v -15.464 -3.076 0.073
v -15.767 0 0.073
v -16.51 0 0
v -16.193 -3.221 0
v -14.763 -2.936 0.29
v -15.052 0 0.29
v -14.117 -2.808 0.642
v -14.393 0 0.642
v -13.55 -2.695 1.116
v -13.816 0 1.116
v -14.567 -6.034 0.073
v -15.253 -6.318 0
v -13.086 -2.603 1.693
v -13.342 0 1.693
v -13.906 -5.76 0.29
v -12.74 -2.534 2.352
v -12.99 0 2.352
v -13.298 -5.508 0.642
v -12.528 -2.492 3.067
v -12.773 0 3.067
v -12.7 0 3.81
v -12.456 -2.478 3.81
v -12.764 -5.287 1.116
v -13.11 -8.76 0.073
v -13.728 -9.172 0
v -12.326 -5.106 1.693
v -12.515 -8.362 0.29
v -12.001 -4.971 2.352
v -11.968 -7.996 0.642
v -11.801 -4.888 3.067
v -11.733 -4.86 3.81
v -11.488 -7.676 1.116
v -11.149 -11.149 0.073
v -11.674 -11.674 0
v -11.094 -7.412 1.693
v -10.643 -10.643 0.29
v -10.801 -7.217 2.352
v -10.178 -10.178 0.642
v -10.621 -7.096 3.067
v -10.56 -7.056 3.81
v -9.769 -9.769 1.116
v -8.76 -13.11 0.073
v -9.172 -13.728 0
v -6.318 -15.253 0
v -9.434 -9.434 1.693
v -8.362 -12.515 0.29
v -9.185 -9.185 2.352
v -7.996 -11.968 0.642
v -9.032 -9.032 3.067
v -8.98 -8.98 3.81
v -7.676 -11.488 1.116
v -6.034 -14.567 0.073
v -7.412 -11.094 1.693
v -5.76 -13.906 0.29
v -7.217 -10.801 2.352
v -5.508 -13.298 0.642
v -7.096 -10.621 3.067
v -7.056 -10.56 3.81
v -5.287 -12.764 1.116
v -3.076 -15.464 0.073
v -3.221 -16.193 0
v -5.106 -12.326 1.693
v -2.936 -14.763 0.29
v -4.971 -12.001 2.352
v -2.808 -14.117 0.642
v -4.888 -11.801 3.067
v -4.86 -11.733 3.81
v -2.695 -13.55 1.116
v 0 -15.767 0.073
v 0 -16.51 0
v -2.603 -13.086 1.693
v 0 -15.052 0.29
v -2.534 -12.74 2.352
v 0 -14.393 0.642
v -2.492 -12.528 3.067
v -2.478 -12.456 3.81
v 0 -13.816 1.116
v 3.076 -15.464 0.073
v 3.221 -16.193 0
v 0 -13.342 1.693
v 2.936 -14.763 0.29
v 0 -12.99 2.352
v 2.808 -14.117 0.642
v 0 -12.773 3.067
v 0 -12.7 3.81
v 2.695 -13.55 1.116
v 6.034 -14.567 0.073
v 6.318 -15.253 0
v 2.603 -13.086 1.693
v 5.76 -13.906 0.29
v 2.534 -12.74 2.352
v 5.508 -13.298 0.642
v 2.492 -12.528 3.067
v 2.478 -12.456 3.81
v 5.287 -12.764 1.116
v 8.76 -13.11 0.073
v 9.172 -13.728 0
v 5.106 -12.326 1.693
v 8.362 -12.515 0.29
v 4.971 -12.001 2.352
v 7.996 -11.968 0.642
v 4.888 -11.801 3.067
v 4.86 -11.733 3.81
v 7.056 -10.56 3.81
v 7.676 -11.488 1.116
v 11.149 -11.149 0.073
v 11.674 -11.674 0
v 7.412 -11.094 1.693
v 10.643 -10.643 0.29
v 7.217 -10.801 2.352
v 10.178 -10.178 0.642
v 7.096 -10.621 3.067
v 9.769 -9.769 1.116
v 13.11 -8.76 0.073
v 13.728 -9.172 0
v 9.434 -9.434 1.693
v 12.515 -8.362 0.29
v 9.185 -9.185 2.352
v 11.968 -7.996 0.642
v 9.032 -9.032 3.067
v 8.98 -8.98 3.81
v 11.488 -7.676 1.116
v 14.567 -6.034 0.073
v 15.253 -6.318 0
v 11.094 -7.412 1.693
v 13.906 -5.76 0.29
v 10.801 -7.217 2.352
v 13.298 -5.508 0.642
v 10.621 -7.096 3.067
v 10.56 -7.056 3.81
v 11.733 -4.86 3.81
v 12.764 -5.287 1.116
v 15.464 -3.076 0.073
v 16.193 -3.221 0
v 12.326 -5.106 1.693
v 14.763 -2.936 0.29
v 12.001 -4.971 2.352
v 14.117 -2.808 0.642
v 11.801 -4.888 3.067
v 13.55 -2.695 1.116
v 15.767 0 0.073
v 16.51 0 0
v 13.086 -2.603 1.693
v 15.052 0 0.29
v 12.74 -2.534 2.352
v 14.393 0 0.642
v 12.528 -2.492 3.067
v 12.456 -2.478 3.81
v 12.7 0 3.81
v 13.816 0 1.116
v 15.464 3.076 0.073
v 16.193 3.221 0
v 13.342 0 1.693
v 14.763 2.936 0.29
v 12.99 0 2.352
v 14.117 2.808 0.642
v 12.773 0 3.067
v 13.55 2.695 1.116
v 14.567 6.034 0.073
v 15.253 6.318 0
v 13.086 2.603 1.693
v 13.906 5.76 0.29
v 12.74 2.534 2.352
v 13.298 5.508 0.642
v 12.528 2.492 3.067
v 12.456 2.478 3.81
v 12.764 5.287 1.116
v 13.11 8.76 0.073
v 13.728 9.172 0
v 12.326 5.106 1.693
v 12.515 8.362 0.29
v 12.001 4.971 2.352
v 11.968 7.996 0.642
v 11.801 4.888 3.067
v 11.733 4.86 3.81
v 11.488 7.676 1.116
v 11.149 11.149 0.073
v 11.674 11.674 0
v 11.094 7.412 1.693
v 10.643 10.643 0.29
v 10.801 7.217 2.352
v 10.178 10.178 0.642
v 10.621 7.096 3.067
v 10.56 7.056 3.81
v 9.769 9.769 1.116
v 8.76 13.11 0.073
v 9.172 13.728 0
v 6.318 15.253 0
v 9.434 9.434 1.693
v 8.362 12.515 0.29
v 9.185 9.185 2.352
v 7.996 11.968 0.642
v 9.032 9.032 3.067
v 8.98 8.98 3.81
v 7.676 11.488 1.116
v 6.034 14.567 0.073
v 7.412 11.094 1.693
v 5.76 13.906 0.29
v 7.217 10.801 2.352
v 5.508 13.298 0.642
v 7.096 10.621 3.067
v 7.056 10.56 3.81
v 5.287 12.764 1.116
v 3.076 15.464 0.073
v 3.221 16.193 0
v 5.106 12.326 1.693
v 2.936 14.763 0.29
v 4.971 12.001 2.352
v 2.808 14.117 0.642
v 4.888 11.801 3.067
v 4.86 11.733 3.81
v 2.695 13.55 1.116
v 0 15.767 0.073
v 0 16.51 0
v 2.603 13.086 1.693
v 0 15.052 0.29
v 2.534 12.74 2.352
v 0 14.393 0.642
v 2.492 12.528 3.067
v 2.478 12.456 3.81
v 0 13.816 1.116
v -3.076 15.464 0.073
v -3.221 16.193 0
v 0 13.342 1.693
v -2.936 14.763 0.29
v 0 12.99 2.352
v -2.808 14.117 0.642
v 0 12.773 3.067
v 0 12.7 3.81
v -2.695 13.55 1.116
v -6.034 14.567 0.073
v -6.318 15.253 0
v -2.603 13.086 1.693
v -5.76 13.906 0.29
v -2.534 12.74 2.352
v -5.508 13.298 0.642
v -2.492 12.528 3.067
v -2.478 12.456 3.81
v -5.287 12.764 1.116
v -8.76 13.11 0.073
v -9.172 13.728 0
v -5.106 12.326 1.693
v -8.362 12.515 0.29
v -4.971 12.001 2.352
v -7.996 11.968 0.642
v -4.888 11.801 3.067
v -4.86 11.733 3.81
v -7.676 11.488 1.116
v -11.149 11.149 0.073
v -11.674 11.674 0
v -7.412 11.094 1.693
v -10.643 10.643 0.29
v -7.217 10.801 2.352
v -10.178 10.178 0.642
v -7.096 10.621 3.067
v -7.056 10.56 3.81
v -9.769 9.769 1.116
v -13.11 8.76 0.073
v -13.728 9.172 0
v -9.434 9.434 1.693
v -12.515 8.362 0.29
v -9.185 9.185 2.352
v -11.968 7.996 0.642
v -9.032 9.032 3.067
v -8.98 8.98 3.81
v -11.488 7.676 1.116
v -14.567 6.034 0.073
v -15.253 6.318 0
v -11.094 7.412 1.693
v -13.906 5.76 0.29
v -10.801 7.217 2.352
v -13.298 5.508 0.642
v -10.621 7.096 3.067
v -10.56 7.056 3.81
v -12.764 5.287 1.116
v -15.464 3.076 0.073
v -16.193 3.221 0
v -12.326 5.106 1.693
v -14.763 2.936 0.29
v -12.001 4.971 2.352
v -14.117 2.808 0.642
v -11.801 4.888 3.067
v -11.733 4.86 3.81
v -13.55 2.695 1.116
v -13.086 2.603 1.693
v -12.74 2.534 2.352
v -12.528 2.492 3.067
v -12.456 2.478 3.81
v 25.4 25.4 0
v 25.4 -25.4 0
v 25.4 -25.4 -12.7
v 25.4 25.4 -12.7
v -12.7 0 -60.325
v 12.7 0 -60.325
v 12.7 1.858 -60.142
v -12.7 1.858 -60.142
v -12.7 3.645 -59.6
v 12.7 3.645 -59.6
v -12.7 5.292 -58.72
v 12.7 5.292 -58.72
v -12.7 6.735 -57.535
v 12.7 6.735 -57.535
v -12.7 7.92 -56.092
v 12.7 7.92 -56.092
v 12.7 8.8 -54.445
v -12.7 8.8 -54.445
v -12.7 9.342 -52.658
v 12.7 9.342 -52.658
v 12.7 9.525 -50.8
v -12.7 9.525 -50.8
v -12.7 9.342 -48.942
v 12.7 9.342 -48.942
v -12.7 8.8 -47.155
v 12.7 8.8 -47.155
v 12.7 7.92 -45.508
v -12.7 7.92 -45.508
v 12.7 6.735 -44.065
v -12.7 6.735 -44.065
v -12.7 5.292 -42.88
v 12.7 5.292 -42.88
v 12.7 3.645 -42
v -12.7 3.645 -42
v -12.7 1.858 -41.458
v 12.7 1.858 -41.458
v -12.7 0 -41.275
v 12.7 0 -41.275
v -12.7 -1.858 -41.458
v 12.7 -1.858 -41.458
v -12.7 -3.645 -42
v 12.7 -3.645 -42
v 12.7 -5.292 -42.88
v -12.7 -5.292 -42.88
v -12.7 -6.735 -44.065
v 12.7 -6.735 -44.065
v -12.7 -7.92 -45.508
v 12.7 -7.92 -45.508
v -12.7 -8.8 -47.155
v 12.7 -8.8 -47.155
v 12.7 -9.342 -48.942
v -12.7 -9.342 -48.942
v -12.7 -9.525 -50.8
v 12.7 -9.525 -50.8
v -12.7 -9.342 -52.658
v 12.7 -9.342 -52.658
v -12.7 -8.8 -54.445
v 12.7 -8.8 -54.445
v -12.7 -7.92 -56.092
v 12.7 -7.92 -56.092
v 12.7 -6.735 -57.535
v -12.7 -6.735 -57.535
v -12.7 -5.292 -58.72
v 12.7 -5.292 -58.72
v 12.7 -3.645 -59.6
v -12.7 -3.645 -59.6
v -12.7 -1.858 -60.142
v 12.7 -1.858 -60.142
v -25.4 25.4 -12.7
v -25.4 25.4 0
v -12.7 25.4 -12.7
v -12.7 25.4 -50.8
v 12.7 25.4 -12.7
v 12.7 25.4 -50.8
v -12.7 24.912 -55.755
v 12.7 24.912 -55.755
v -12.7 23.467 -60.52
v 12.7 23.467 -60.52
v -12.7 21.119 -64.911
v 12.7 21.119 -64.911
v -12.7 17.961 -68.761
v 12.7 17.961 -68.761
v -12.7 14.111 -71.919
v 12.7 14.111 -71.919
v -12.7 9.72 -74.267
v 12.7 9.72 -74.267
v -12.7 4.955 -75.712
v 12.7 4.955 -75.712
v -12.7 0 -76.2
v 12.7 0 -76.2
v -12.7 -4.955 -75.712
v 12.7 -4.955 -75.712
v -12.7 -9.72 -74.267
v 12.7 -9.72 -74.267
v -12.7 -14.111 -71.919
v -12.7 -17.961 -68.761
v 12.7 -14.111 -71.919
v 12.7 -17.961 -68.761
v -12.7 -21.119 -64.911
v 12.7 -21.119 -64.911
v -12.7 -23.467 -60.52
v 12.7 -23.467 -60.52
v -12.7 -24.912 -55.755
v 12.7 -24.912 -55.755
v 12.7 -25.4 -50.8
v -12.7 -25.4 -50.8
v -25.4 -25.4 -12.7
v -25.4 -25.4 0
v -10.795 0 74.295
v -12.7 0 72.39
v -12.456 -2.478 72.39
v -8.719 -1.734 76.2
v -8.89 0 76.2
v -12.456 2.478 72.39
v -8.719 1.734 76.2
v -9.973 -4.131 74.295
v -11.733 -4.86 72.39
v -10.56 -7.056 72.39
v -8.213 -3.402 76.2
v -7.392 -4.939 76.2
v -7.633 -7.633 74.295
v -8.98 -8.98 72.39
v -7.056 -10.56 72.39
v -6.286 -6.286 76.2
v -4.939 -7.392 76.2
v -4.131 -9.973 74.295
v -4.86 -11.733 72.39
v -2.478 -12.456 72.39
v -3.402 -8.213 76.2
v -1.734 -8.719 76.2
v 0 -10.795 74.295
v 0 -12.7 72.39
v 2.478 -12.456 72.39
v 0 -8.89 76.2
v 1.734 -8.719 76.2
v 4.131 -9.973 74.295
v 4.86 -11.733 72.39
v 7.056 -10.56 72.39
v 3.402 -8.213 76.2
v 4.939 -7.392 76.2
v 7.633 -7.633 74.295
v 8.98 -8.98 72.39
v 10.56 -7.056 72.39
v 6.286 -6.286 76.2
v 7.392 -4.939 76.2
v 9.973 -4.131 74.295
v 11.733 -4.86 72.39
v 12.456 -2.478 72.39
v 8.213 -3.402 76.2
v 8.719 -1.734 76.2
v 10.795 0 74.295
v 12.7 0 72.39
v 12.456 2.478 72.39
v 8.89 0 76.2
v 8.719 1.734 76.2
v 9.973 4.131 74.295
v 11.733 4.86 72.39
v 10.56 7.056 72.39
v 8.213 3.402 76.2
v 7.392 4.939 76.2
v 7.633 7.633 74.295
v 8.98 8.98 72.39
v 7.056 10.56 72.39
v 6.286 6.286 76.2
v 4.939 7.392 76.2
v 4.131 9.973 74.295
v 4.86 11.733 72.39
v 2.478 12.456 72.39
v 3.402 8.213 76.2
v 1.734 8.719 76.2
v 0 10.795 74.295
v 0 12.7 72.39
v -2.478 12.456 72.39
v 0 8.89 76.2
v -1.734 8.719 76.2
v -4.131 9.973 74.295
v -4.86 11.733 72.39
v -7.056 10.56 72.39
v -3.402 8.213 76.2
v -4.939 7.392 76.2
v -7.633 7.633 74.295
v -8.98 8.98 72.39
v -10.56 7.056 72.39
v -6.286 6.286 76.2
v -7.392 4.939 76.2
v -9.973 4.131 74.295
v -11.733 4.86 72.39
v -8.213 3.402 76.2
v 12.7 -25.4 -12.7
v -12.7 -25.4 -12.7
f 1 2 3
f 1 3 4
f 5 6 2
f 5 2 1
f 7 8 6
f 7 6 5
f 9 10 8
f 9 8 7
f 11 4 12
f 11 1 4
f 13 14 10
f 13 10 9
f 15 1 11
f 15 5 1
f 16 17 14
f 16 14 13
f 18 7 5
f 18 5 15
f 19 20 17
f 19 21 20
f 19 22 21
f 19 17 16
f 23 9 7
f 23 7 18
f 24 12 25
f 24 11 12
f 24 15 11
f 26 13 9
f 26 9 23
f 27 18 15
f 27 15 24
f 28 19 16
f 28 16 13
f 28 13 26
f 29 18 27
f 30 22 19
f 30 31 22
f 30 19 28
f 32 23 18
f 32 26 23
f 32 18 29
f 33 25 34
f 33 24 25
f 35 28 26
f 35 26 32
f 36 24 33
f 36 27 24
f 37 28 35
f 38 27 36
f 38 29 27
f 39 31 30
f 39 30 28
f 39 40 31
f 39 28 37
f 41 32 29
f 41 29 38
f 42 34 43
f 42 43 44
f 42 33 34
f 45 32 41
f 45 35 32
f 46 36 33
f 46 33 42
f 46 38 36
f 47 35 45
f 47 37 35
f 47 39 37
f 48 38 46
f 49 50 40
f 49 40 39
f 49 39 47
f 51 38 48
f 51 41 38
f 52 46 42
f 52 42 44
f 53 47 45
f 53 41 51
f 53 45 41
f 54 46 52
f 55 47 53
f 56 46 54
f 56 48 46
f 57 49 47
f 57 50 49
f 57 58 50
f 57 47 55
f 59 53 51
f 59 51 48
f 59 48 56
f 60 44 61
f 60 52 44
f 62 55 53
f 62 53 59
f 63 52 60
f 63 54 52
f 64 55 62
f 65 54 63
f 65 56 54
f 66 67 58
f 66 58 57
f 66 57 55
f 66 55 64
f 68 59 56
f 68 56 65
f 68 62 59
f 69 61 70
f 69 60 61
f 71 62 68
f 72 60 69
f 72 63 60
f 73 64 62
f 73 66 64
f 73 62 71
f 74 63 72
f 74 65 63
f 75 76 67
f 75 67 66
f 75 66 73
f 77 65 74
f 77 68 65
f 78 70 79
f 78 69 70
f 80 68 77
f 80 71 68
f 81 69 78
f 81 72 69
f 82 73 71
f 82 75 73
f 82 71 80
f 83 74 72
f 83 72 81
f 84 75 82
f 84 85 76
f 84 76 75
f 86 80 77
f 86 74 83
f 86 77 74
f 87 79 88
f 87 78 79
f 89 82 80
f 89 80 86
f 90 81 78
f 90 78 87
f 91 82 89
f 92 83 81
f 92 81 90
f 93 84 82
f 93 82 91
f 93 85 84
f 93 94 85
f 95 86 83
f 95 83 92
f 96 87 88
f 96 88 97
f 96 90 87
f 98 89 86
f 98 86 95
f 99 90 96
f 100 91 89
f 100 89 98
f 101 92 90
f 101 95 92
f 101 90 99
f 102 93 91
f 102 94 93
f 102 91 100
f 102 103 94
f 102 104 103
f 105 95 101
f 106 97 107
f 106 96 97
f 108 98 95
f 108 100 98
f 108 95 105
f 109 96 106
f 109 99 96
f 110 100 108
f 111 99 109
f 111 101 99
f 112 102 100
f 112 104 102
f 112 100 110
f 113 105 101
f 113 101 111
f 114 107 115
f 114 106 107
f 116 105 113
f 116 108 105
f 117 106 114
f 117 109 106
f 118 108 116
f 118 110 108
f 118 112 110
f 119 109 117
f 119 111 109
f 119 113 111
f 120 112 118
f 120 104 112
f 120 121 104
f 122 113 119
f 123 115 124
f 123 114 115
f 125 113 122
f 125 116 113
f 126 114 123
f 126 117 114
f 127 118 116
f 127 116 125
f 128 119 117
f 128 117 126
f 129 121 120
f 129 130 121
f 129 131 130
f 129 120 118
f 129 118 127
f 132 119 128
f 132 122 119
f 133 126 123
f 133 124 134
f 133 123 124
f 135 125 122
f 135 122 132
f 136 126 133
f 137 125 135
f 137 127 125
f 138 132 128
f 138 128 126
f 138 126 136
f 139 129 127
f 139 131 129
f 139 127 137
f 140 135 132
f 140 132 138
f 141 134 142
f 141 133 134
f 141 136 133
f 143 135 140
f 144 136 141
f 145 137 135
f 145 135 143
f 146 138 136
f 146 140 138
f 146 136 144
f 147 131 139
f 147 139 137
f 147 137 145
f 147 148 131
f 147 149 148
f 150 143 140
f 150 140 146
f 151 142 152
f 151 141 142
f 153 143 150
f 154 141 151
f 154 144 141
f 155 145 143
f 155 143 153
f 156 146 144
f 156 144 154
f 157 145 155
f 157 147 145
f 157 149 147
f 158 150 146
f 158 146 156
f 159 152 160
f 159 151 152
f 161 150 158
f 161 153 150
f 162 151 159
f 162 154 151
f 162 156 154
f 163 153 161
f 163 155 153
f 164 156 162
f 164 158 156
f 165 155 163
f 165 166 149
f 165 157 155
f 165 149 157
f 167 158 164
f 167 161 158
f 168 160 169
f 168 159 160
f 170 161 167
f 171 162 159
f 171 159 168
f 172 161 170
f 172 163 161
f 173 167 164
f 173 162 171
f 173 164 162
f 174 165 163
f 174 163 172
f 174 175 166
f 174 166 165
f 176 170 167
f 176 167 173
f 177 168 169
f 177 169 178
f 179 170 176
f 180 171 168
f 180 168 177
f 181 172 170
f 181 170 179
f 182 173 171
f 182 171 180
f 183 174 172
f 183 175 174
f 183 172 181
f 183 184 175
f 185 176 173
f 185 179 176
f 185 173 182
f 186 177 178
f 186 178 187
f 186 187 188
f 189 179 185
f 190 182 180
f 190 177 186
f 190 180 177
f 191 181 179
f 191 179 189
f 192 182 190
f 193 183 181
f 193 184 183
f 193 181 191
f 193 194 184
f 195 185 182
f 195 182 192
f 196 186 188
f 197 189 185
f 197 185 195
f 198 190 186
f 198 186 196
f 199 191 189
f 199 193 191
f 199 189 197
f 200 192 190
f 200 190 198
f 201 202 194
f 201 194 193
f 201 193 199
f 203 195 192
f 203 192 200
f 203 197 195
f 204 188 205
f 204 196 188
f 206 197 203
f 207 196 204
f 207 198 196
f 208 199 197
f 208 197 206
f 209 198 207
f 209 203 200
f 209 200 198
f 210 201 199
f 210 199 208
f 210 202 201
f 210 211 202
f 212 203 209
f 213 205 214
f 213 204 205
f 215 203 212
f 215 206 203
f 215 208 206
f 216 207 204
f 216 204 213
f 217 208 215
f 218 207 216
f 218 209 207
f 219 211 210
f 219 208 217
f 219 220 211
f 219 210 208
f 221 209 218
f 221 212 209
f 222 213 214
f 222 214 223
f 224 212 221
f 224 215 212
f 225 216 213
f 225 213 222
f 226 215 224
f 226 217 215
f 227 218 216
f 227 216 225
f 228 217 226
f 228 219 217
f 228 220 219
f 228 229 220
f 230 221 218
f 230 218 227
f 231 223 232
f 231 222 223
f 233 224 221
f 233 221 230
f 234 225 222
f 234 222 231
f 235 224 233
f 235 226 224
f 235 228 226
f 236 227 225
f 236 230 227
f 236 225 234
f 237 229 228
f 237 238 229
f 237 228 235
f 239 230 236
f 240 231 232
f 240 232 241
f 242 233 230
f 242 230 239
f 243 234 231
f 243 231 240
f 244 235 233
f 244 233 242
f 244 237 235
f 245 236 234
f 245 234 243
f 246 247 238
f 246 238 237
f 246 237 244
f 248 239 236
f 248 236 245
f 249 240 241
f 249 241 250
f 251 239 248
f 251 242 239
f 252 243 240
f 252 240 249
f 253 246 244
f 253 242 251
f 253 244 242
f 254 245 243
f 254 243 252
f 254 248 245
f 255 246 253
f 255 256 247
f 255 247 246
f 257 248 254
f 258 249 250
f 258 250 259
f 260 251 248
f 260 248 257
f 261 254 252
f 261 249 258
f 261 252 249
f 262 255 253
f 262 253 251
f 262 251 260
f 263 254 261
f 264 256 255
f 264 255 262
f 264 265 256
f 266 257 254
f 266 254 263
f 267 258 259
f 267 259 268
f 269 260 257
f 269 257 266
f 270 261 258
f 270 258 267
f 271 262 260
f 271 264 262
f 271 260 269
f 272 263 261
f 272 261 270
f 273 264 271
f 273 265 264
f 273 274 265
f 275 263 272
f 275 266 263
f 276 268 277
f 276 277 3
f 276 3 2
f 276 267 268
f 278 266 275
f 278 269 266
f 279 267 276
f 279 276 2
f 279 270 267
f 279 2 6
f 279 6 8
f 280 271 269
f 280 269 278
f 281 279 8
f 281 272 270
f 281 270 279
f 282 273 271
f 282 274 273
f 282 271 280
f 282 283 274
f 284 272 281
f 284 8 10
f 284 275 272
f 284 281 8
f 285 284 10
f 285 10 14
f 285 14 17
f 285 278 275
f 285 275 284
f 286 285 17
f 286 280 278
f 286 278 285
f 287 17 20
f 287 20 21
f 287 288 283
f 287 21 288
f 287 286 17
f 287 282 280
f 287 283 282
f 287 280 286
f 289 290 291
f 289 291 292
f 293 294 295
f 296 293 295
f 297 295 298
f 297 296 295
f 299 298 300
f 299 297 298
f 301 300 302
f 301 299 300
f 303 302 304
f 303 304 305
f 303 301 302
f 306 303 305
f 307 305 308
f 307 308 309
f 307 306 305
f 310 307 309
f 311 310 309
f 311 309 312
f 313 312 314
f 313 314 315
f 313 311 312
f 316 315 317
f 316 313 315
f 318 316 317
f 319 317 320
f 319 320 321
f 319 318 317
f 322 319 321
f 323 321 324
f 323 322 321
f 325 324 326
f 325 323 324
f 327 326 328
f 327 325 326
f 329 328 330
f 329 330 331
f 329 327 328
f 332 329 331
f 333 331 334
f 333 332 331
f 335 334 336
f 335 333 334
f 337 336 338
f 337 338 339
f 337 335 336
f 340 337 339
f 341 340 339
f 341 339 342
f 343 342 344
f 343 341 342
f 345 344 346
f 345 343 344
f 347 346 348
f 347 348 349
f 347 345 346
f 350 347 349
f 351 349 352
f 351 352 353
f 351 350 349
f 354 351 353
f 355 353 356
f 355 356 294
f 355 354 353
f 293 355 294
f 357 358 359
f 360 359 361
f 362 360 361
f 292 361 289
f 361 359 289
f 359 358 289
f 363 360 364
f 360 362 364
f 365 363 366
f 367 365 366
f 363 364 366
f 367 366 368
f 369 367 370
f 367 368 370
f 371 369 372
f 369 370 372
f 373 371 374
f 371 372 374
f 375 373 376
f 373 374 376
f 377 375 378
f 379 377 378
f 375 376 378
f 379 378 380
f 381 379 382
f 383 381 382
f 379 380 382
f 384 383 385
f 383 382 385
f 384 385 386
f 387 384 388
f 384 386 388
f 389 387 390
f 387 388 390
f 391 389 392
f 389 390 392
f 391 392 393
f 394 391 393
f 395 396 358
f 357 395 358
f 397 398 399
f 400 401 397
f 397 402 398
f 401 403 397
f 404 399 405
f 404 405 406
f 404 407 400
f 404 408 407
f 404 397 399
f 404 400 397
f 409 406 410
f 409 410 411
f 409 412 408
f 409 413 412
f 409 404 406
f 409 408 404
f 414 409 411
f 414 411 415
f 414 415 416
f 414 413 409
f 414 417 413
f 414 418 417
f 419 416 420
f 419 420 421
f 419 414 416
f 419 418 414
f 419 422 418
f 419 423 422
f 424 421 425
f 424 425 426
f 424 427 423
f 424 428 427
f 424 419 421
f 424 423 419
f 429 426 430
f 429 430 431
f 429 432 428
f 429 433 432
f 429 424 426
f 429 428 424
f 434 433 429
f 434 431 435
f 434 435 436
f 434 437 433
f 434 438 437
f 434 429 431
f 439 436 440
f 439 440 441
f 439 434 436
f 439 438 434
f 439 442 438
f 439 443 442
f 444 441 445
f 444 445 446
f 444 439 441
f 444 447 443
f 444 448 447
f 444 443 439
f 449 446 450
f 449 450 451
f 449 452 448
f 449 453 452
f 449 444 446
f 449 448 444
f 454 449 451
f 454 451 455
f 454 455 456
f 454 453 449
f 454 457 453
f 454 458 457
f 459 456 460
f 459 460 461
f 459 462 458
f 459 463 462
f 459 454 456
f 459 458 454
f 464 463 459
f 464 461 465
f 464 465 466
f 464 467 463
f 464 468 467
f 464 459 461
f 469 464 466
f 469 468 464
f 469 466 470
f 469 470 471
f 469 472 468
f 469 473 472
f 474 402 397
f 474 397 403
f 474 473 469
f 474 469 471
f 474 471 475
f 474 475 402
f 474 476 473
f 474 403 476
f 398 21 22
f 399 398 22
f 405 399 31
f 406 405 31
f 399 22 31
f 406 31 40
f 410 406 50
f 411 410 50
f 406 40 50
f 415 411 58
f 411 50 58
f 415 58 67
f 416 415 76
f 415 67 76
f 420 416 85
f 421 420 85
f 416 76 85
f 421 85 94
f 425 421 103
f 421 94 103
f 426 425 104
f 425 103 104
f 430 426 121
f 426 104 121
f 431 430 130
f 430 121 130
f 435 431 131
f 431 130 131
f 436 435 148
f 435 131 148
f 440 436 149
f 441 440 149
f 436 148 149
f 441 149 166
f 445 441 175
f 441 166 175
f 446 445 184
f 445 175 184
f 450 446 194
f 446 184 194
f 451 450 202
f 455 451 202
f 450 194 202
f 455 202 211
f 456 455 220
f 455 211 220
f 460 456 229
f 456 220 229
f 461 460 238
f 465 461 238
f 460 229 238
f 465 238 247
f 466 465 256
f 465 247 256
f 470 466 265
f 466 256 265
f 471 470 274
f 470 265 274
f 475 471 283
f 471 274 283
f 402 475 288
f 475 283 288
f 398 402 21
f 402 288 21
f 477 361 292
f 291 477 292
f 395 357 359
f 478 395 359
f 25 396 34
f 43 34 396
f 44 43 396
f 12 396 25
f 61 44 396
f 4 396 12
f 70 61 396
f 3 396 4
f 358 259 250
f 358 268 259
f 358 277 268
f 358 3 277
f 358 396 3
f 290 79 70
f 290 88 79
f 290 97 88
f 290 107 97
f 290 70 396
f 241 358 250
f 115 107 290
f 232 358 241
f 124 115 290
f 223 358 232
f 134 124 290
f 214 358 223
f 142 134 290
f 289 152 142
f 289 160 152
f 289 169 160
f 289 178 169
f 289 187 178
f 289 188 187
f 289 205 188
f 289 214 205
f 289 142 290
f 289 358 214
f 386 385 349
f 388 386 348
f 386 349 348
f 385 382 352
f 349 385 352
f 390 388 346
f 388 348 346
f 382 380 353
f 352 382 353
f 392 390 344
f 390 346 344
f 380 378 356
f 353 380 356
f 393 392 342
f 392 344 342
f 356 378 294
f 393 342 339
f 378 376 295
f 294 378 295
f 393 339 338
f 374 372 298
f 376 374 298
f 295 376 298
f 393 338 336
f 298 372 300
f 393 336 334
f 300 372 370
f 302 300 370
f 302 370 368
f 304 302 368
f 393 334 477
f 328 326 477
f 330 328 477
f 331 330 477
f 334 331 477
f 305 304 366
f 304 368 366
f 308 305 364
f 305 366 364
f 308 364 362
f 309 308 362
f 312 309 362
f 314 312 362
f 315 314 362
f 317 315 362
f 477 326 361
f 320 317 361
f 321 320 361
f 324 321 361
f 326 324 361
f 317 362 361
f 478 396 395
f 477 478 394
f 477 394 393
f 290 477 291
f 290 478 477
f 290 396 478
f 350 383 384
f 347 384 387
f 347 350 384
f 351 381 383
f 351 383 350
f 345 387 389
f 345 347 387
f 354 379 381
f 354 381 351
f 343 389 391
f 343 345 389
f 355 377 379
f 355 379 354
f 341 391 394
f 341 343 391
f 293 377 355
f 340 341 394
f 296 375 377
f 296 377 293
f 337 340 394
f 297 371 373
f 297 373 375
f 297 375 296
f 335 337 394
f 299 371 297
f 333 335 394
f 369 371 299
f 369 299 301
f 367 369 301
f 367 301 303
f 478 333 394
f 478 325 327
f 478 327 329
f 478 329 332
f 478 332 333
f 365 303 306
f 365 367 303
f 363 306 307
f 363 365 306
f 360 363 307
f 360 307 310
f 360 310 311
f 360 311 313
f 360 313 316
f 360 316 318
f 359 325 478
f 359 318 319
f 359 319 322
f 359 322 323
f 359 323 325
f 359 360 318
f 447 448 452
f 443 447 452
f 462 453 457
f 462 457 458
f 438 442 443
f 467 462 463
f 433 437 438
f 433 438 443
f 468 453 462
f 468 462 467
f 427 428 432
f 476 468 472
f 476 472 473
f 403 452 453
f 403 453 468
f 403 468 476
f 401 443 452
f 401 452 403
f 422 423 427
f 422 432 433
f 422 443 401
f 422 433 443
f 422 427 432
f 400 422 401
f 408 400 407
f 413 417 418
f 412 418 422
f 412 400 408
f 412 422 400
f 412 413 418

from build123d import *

# Parameters (mm, degrees)
SKETCH1_W         = 50.8
SKETCH1_H         = 50.8
SQUARE_BASE_DEPTH = 12.7
SKETCH2_R         = 12.7
LONG_PIN_DEPTH    = 76.2
SKETCH3_R         = 9.525
EYELET_DEPTH      = 12.7
FILLET1_R         = 3.81
CHAMFER1_SIZE     = 3.81


with BuildPart() as part:
    # Sketch1 → Square Base (new body)
    with BuildSketch(Plane.XY):
        Rectangle(SKETCH1_W, SKETCH1_H)
    extrude(amount=-SQUARE_BASE_DEPTH)

    # Sketch2 → Long Pin (add)
    with BuildSketch(Plane.XY):
        with Locations(Location((0, 0, 0), (0, 0, 180))):
            Circle(SKETCH2_R)
    extrude(amount=LONG_PIN_DEPTH)

    # Sketch3 → Eyelet (add, symmetric)
    with BuildSketch(Plane(origin=(0, 0, 0), x_dir=(0, 0, -1), z_dir=(1, 0, 0))):
        with BuildLine():
            Line((12.7, 25.4), (50.8, 25.4))
            ThreePointArc((50.8, 25.4), (76.2, 0), (50.8, -25.4))
            Line((50.8, -25.4), (12.7, -25.4))
            Line((12.7, -25.4), (12.7, 25.4))
        make_face()
        with Locations((50.8, 0)):
            Circle(SKETCH3_R, mode=Mode.SUBTRACT)
    extrude(amount=EYELET_DEPTH, both=True)

    # Fillet1
    fillet1_edges = [part.edges().sort_by_distance(p)[0] for p in [
        (12.7, 0, 0),
    ]]
    fillet(fillet1_edges, radius=FILLET1_R)

    # Chamfer1
    chamfer1_edges = [part.edges().sort_by_distance(p)[0] for p in [
        (12.7, 0, 76.2),
    ]]
    chamfer(chamfer1_edges, length=CHAMFER1_SIZE)


solid = part.part
